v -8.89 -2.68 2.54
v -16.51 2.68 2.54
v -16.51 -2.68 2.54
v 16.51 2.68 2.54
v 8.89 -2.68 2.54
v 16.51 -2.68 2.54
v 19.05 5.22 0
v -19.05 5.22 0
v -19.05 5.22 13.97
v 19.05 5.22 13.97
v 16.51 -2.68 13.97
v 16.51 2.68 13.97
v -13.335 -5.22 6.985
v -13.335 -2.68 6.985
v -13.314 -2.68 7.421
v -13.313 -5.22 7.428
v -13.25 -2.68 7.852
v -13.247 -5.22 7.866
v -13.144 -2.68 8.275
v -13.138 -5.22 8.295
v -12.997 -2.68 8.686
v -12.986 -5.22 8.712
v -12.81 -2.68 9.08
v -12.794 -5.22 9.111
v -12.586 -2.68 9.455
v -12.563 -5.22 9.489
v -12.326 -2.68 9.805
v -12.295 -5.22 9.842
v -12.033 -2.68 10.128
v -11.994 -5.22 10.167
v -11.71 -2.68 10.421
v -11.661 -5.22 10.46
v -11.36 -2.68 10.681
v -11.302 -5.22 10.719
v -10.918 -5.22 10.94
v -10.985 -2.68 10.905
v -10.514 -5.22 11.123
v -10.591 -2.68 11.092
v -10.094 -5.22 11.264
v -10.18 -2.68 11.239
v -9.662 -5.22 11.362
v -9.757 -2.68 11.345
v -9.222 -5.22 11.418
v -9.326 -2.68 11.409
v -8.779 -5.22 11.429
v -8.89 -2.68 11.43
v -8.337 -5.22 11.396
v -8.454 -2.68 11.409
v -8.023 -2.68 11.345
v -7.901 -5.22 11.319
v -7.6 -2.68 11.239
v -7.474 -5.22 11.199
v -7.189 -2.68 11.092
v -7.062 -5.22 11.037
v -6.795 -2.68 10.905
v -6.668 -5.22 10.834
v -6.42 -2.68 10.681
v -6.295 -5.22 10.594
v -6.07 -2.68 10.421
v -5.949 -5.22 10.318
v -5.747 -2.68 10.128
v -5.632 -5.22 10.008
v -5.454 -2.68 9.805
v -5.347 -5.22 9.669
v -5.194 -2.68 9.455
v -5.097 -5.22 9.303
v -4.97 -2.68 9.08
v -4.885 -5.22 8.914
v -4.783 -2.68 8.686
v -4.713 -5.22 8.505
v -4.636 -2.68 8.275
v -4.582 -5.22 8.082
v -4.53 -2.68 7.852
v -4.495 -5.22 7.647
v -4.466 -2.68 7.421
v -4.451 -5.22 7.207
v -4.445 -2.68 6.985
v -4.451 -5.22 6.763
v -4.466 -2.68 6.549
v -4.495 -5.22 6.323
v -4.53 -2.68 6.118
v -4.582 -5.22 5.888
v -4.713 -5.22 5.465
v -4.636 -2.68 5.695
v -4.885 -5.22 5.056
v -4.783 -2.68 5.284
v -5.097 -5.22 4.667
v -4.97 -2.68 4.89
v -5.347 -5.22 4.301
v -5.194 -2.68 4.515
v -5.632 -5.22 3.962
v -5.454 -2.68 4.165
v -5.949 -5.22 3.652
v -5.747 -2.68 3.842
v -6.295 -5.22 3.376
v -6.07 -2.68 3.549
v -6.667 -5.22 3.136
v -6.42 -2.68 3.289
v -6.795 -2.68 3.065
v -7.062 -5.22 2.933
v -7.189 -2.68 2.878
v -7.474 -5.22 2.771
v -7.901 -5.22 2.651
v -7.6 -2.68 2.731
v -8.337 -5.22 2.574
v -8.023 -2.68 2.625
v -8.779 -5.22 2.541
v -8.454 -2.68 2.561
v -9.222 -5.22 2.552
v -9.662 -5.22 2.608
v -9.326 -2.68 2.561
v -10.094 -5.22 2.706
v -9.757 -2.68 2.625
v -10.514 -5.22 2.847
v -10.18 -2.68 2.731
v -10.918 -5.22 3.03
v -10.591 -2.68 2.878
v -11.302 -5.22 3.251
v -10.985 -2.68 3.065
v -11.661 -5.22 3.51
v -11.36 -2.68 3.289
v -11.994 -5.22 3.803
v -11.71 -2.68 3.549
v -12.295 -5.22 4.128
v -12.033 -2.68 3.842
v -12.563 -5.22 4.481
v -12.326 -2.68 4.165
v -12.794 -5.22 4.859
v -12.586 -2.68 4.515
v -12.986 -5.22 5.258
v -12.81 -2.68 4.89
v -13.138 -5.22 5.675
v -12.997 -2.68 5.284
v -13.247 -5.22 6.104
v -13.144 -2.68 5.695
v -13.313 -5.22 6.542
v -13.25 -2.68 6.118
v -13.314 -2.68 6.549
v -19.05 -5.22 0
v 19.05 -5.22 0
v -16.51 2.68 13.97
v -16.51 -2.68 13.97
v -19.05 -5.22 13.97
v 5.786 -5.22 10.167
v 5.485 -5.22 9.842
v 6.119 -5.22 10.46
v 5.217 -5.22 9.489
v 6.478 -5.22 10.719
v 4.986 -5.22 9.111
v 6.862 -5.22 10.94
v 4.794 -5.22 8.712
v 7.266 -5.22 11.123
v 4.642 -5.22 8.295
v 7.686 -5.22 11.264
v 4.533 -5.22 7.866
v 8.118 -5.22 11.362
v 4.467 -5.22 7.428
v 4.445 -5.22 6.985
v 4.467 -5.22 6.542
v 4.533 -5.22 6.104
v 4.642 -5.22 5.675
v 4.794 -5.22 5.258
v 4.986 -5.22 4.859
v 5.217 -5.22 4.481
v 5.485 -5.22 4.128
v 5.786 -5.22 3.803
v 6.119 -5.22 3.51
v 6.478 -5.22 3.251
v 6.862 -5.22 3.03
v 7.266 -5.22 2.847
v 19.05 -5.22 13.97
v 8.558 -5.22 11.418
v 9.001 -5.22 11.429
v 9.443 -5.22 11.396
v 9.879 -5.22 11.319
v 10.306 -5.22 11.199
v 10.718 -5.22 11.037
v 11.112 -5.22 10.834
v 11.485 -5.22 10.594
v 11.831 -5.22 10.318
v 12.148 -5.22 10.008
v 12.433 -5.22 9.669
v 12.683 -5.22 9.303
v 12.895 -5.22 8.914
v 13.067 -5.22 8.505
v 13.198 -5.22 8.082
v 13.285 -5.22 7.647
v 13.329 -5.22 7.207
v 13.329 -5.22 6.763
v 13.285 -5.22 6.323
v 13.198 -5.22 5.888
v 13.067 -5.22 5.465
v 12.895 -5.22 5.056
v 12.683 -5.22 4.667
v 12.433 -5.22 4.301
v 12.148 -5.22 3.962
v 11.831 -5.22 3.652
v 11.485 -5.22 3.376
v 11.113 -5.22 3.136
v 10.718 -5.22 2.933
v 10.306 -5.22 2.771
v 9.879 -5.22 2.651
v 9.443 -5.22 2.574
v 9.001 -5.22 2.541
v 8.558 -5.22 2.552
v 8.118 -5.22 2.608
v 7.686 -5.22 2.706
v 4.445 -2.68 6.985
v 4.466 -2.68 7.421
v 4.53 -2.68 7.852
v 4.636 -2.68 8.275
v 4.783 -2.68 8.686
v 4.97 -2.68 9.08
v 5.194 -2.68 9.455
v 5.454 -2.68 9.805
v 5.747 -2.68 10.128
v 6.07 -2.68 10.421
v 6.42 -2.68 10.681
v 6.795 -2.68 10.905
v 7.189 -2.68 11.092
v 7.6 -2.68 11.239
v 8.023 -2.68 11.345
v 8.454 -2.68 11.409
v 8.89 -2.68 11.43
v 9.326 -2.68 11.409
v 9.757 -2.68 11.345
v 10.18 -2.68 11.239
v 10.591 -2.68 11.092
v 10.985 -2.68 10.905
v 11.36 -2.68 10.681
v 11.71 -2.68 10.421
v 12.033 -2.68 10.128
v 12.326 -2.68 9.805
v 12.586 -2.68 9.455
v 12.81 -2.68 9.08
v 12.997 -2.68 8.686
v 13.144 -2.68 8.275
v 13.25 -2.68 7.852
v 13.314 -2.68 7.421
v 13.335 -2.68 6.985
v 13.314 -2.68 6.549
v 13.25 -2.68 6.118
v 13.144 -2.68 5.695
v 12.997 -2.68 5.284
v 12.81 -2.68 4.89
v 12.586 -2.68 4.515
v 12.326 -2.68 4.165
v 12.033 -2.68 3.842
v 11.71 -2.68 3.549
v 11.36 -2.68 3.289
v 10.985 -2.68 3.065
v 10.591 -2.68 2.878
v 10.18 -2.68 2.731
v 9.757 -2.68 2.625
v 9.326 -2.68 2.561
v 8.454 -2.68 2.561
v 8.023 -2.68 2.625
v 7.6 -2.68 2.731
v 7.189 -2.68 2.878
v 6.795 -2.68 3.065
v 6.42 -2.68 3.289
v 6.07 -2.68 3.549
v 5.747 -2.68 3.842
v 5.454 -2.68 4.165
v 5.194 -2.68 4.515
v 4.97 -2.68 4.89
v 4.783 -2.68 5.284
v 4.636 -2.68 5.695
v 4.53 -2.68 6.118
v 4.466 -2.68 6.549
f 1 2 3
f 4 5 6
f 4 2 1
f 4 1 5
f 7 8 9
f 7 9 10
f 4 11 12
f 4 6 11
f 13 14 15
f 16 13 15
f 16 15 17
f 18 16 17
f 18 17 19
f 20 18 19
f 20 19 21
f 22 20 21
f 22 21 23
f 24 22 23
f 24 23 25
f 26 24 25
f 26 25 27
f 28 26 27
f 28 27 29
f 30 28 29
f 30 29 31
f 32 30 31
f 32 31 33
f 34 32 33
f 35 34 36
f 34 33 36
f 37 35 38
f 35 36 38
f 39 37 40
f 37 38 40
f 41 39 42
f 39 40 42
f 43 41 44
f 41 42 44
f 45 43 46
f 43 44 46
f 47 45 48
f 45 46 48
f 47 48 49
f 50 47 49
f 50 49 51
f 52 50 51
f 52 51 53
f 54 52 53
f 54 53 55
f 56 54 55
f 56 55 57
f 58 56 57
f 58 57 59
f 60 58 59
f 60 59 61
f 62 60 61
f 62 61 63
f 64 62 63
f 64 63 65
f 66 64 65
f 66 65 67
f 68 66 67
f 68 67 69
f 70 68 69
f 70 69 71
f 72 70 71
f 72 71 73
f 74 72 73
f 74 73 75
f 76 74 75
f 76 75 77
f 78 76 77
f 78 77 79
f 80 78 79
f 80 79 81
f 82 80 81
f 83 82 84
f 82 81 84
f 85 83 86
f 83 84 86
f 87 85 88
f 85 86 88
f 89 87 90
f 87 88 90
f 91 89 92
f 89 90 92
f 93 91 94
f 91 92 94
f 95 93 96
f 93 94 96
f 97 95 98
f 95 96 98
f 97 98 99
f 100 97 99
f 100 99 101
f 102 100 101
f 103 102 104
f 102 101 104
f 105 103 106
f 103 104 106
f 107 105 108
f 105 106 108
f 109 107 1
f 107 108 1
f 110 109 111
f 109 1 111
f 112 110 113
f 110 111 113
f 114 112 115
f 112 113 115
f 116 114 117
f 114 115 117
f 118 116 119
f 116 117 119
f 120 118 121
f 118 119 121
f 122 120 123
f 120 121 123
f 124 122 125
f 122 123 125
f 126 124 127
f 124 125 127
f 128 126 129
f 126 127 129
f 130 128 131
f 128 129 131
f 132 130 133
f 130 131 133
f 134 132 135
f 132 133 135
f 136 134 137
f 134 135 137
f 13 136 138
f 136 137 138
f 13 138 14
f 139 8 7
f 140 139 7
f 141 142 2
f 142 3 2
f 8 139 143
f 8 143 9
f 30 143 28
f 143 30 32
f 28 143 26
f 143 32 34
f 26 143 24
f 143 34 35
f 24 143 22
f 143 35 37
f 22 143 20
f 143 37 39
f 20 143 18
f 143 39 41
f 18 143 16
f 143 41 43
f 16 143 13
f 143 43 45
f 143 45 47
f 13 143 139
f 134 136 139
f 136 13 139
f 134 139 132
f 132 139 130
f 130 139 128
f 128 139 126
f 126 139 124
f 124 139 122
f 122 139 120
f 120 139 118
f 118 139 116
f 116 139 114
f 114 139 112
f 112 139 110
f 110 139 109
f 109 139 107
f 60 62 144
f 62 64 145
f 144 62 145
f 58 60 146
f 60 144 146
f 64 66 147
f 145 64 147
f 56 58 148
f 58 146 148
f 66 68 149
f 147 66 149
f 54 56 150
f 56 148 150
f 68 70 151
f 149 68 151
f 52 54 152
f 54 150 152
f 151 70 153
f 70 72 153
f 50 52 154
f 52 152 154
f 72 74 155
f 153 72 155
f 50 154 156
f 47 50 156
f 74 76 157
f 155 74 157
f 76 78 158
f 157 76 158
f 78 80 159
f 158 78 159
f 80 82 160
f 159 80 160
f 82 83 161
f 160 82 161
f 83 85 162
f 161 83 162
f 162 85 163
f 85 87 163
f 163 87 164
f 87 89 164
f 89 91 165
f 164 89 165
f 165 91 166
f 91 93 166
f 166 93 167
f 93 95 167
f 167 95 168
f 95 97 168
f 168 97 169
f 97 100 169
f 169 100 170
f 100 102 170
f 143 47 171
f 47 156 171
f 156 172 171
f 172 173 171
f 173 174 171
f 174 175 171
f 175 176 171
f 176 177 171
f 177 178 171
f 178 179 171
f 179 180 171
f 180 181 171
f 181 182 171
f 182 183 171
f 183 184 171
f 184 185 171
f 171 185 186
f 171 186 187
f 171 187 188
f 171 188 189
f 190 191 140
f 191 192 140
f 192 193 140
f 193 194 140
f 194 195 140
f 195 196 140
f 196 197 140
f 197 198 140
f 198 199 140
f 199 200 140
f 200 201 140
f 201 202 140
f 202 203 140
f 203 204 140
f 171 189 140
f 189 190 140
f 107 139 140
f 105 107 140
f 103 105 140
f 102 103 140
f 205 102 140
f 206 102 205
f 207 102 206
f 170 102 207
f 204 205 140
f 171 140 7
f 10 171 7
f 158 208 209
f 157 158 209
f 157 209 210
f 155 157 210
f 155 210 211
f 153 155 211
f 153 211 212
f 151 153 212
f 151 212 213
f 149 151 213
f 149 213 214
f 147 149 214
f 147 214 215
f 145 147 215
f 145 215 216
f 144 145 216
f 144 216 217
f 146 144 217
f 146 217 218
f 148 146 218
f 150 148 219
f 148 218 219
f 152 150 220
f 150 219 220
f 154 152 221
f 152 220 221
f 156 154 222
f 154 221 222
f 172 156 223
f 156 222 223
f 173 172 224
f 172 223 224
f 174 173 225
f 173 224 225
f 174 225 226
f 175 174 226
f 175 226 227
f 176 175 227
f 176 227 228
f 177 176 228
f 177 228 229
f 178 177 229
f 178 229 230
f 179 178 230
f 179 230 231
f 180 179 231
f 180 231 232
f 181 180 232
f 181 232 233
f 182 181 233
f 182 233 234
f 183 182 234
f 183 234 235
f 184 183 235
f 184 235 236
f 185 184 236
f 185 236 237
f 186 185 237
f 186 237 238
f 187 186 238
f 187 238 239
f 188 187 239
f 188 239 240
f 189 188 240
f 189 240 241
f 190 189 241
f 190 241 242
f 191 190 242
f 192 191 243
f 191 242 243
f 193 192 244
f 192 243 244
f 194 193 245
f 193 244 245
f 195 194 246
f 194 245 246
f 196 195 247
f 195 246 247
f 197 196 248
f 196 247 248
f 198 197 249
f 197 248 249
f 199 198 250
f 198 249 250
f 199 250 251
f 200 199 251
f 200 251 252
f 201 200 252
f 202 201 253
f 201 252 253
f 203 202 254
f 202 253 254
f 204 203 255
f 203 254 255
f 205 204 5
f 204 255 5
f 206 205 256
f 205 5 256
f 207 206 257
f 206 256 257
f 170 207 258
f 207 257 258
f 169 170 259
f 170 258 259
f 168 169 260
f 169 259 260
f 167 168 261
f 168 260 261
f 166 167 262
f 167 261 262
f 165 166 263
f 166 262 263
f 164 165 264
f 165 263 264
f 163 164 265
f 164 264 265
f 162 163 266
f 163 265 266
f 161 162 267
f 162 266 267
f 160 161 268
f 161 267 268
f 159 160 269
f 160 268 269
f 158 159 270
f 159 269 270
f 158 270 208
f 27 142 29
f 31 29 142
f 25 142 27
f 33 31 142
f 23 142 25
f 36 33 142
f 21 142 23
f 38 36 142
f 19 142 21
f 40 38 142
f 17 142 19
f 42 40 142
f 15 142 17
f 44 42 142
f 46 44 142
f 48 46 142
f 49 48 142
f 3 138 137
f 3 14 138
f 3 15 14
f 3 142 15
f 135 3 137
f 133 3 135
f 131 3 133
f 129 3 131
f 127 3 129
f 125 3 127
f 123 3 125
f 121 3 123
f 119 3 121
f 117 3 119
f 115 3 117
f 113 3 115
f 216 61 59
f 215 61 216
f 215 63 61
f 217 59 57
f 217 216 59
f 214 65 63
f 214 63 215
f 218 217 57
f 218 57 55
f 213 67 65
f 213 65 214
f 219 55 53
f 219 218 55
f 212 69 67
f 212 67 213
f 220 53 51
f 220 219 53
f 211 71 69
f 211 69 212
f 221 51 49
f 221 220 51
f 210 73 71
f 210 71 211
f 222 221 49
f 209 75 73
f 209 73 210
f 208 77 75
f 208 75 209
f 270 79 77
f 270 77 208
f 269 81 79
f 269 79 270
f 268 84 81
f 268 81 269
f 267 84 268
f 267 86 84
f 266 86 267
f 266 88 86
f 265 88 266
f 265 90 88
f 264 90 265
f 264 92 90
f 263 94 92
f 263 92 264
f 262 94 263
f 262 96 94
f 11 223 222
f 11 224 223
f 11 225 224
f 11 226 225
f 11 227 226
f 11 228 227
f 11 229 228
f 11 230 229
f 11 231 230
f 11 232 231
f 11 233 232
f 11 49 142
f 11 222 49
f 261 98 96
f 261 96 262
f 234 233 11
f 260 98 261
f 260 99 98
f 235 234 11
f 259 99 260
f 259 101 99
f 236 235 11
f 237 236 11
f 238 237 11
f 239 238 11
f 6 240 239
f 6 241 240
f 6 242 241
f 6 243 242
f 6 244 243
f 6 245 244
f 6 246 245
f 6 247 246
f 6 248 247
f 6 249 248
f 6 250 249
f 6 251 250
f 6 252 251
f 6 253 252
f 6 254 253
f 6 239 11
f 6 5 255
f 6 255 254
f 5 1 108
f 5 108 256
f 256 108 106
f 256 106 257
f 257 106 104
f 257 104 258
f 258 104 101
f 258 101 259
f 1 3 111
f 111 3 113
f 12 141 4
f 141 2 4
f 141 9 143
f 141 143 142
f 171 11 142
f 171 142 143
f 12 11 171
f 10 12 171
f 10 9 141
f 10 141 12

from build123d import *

# Parameters (mm, degrees)
F0_W     = 38.1
F0_H     = 10.4394
F1_DEPTH = 13.97
F2_T     = -2.54
F4_D     = 8.89
F4_DEPTH = 2.54


with BuildPart() as f1:
    # F0 (on Top) → F1 (new body)
    with BuildSketch(Plane.XY):
        Rectangle(F0_W, F0_H)
    extrude(amount=F1_DEPTH)

    # F2
    f2_openings = [f1.faces().sort_by_distance(p)[0] for p in [
        (0, 0, 13.97),
    ]]
    offset(amount=F2_T, openings=f2_openings)

    # F4
    with Locations(Plane.XZ.offset(5.2197)):
        with Locations((-8.89, 6.985), (8.89, 6.985)):
            Hole(F4_D / 2, depth=F4_DEPTH)


solid = f1.part
